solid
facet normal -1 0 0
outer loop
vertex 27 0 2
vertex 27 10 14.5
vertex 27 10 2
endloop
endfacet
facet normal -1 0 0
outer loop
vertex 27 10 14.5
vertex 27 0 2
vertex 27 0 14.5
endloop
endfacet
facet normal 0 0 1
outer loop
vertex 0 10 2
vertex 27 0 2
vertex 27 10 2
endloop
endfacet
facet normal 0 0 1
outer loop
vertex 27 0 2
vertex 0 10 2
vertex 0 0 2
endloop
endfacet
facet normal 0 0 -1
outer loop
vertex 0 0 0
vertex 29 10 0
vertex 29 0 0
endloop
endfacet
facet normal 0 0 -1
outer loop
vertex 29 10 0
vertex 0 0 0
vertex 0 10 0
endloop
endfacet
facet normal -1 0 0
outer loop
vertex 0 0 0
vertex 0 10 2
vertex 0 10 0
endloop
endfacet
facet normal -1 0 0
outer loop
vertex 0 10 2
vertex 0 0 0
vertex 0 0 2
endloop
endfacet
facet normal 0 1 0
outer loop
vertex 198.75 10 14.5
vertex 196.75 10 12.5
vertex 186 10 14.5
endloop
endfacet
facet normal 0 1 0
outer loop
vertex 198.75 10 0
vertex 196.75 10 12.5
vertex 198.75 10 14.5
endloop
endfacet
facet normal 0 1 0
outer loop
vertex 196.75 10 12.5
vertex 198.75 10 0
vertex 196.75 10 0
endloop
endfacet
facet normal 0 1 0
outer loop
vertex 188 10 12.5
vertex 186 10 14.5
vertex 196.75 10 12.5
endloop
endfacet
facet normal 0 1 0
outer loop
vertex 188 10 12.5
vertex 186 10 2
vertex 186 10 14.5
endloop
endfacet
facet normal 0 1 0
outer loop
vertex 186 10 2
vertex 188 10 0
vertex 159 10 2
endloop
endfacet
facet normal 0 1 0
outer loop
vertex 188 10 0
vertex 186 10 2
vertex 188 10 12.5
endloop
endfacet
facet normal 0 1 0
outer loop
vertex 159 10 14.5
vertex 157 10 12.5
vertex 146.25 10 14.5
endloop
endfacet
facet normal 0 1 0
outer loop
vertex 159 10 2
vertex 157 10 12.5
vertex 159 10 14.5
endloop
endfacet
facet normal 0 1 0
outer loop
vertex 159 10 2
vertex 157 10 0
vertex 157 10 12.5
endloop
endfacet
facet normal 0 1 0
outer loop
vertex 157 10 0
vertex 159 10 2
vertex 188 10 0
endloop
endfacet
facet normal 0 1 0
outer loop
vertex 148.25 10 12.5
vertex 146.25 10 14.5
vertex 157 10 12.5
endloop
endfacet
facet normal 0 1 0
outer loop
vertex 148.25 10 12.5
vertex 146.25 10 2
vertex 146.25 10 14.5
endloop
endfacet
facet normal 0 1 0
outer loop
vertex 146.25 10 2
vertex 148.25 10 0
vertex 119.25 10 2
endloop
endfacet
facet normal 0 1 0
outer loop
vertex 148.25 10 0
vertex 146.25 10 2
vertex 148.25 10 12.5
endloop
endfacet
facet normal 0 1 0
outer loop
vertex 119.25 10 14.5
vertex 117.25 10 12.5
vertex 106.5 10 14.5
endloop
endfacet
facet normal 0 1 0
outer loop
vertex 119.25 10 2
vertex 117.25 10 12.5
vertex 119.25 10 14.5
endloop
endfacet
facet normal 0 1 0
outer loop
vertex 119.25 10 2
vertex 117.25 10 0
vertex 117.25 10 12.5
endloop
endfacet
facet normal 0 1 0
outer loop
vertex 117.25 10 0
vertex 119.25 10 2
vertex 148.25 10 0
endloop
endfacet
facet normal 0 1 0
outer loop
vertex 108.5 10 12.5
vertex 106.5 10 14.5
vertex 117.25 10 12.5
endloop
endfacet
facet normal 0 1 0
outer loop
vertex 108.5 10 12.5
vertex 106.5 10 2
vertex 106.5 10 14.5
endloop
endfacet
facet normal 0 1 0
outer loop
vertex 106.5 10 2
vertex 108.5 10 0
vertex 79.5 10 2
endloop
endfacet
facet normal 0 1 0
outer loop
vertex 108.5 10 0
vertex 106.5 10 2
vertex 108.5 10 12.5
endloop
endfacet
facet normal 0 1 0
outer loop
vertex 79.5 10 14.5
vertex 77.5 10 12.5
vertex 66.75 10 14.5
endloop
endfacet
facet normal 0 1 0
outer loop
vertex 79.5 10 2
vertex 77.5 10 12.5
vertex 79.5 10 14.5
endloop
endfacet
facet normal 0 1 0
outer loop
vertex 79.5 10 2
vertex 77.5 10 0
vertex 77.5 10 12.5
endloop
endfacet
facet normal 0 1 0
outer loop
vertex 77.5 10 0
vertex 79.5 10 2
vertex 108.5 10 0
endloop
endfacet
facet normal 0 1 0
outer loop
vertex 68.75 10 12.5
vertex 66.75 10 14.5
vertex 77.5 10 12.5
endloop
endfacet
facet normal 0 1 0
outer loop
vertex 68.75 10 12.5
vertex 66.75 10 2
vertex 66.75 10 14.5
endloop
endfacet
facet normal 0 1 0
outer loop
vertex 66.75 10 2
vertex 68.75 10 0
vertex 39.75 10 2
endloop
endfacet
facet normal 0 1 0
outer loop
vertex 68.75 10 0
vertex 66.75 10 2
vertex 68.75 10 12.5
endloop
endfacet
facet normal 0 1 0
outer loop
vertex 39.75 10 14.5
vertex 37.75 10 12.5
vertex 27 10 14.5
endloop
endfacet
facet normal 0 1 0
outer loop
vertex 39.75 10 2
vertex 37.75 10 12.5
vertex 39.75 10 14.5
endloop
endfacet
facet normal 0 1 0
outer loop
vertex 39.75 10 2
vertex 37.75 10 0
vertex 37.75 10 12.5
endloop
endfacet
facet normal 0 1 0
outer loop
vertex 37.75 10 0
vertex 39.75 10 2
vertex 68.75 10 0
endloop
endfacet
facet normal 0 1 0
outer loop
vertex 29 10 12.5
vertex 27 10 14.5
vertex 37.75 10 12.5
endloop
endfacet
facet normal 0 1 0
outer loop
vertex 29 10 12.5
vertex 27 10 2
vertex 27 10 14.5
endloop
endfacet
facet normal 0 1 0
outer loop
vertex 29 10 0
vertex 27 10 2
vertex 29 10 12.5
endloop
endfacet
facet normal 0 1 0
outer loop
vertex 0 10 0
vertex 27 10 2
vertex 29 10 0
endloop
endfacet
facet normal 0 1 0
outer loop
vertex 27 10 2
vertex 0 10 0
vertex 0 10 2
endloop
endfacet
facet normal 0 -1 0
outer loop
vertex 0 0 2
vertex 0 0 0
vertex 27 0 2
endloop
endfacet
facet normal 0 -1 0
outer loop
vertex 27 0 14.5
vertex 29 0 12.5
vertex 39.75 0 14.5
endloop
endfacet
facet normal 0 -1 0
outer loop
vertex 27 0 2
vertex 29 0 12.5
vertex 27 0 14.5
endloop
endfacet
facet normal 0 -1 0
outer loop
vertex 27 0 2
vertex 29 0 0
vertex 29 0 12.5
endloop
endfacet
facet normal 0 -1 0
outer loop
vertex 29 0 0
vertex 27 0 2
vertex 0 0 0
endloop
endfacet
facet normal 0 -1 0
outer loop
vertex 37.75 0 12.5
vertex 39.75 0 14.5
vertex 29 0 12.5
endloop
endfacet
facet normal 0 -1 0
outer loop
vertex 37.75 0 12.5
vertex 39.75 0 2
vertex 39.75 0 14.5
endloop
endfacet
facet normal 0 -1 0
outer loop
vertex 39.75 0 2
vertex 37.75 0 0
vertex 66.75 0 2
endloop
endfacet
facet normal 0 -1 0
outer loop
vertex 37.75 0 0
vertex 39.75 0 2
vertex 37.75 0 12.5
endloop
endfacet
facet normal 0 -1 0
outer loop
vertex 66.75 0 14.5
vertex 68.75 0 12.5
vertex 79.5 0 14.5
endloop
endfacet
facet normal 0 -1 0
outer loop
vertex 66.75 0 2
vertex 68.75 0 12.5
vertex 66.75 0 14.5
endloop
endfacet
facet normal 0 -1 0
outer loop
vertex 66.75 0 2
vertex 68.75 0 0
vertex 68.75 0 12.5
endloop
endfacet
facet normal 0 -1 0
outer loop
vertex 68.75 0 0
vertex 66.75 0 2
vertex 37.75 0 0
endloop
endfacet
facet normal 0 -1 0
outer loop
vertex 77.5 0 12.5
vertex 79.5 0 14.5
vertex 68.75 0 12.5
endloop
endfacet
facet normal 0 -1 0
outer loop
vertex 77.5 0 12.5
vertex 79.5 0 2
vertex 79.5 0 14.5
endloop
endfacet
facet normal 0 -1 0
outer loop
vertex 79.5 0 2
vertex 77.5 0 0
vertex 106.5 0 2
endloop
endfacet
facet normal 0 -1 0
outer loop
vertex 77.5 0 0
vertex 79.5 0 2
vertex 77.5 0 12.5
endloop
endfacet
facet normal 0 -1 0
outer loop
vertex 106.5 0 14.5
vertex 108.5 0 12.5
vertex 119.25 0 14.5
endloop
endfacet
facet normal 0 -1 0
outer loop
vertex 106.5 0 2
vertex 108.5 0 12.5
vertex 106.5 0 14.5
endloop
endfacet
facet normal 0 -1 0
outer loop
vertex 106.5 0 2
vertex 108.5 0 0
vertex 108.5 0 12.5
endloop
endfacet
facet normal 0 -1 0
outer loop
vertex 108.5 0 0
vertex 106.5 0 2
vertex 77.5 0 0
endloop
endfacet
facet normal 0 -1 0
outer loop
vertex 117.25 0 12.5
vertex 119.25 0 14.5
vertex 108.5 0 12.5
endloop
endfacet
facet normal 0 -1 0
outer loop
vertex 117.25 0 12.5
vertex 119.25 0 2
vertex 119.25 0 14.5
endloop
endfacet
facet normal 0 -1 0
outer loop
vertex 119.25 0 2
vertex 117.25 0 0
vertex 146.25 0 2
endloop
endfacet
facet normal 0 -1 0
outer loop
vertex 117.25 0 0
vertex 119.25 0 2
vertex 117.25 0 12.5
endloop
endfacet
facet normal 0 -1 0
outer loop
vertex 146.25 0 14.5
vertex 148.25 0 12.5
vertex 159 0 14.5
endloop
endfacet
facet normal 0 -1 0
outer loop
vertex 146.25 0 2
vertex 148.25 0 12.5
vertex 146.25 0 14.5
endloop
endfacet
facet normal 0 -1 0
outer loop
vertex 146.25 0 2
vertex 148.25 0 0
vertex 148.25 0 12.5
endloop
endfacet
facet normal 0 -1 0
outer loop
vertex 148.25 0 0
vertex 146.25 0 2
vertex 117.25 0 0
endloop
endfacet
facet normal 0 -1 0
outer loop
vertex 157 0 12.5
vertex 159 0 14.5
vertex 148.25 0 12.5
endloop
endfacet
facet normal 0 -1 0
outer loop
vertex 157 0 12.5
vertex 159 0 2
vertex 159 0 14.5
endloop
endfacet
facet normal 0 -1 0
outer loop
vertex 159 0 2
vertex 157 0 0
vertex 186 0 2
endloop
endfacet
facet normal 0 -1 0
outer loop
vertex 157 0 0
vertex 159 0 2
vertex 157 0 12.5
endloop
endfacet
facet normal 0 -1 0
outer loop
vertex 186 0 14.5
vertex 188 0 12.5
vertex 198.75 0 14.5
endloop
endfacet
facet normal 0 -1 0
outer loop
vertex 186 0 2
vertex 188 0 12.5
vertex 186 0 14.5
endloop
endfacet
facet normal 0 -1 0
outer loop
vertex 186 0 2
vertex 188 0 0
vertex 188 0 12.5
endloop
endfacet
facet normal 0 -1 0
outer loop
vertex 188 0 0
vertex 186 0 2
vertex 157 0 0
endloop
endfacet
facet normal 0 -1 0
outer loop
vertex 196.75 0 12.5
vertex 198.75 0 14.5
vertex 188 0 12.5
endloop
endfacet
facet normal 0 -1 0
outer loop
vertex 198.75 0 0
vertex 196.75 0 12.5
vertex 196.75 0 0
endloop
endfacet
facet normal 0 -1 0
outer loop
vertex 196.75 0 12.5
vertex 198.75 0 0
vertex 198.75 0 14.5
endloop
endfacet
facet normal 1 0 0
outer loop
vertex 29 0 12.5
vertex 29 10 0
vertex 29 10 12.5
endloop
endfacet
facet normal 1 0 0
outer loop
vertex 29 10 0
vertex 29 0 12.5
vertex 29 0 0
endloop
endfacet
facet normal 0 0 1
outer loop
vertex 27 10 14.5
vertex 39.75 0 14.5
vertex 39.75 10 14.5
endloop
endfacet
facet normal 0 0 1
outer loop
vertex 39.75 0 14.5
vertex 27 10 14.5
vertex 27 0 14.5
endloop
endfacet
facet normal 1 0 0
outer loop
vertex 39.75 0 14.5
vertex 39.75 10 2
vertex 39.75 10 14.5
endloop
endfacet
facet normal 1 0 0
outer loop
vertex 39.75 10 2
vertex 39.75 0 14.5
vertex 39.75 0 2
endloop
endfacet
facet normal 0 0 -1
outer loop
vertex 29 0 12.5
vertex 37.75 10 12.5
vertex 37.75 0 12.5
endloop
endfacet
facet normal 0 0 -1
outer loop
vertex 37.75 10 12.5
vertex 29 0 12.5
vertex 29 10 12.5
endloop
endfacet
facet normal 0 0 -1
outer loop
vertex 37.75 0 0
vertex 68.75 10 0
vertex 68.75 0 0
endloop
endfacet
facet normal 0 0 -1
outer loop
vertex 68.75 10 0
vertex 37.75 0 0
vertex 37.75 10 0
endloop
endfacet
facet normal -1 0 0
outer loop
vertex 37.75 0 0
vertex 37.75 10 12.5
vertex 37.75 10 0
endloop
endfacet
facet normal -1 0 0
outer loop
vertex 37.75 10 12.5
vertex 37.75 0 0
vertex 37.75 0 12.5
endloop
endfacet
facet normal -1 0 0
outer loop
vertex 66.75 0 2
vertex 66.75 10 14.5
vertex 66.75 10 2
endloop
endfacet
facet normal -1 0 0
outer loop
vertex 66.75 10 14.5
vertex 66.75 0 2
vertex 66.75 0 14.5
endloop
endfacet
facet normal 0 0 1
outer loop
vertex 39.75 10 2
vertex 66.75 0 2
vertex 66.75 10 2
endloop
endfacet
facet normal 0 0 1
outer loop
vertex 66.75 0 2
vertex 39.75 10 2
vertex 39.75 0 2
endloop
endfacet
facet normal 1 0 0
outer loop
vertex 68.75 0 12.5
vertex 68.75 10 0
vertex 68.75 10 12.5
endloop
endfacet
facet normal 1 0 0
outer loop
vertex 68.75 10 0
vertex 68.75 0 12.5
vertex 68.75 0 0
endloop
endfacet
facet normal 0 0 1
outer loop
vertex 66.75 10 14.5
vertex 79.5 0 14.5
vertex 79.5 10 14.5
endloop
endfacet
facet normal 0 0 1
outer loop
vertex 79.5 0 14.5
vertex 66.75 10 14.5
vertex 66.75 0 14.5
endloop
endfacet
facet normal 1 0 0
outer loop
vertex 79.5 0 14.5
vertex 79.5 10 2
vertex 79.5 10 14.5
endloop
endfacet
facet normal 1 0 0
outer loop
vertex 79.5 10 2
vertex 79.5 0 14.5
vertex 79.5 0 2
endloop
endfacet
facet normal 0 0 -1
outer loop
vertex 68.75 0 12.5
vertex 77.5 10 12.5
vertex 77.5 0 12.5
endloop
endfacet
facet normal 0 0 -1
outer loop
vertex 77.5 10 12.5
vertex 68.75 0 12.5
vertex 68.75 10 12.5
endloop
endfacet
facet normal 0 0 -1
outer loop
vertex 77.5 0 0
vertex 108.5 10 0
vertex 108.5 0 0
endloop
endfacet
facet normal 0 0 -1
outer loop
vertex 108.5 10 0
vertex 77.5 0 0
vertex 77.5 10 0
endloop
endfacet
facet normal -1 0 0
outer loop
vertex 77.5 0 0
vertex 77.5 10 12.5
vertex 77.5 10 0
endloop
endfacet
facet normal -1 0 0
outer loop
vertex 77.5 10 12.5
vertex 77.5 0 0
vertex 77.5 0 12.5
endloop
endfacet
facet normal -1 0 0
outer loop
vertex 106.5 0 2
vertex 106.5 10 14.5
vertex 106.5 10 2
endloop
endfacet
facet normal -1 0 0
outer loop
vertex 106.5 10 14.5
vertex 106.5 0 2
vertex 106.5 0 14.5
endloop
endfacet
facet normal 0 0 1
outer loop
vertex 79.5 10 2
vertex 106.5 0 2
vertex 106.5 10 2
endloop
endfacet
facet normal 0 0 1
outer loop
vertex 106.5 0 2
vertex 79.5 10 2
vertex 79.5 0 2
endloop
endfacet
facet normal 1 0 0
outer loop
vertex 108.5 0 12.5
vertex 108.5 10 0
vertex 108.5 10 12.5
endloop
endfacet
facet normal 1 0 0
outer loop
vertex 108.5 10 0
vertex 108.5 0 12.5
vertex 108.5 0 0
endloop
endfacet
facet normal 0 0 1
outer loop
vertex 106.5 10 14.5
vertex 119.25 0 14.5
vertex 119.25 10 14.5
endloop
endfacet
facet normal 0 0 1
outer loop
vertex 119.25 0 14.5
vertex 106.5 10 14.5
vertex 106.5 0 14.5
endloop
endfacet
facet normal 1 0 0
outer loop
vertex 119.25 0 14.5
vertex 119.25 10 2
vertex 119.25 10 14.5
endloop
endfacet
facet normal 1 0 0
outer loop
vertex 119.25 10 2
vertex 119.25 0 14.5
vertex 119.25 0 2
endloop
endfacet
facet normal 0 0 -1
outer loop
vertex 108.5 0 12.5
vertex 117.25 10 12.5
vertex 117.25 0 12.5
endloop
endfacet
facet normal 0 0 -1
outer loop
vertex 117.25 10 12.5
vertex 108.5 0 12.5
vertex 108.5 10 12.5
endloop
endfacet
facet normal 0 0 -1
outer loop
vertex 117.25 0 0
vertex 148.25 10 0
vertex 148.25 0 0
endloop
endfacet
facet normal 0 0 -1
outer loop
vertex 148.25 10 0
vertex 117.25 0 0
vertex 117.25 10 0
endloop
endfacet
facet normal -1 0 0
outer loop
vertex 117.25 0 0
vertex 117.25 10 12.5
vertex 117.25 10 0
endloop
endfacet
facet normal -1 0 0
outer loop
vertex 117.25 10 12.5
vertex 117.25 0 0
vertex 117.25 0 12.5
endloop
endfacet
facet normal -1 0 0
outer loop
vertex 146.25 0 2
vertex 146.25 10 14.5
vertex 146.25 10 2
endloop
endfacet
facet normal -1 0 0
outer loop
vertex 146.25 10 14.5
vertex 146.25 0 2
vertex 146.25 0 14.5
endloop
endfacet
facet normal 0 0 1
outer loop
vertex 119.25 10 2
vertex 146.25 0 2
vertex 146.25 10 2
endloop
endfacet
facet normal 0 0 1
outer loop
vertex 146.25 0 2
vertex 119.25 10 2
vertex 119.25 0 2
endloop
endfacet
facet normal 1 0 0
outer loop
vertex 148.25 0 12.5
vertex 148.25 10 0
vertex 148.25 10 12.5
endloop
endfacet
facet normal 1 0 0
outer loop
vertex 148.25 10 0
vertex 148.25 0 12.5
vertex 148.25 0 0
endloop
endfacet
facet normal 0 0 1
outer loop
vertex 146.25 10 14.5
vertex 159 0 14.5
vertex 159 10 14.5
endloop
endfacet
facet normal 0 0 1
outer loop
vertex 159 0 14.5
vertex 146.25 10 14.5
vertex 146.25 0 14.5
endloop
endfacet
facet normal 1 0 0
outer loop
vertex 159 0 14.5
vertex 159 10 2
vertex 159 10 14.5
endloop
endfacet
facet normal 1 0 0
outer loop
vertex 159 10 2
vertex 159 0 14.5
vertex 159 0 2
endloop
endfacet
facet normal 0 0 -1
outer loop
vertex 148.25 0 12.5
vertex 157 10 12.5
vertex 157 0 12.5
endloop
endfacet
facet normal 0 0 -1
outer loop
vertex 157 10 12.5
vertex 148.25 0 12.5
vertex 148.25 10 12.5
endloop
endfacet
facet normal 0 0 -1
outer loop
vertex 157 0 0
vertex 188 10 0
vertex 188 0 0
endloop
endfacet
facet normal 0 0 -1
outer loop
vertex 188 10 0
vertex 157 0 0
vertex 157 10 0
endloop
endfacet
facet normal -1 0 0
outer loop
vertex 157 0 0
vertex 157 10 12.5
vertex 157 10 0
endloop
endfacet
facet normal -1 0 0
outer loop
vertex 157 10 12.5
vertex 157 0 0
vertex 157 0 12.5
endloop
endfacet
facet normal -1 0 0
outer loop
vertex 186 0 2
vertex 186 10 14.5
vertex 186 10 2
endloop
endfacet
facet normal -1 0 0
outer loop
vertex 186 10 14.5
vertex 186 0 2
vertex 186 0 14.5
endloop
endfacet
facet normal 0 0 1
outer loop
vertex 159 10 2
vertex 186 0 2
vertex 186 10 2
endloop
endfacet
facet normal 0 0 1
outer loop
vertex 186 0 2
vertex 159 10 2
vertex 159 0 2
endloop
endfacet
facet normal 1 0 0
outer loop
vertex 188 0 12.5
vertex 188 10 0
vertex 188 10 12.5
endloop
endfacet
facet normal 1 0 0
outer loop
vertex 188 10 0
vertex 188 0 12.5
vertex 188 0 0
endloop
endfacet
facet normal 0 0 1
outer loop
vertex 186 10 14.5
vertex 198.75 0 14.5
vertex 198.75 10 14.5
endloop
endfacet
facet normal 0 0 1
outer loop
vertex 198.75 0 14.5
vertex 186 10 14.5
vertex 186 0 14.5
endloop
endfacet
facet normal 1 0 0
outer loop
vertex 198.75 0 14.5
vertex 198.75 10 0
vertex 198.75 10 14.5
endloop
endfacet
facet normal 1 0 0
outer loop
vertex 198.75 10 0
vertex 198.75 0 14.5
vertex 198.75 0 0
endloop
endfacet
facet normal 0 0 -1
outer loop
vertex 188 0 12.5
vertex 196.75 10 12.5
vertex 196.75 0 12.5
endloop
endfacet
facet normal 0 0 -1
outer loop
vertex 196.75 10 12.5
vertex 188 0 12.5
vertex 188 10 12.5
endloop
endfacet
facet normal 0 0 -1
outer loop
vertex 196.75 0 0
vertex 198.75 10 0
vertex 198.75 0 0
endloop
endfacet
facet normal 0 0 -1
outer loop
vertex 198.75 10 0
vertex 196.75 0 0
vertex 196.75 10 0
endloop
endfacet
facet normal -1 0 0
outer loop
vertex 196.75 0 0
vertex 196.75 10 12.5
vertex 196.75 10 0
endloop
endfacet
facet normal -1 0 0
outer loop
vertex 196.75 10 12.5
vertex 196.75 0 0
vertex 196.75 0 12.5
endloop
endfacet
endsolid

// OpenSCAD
$fn = 180;
panel_width = 27;
panel_gap = 12.75;
panel_depth = 12.5;
trim_thickness = 2;
trim_height = 10;

union() {
  trim();
  for (i = [0:4]) {
    translate([(panel_width+panel_gap)*i, 0, 0])
    trim();
  }

  // bottom cable track
  // translate([0, trim_height, 0])
  // difference() {
  //   cube([200.75-trim_thickness, 20, panel_depth+trim_thickness]);

  //   translate([0, trim_thickness, trim_thickness])
  //   cube([200.75-trim_thickness, 20-trim_thickness*2, panel_depth]);
  // }
}

// // generic keyboard arms
// arm_width = 64;
// arm_depth = 10;
// lip_thickness = 5;

// union() {
//   mirror([0, 0, 1])
//   union() {
//     full_trim();
//     for(i = [0:7]) {
//       translate([0, trim_height*i, 0])
//       full_trim();
//     }
//   }

//   translate([-panel_gap, 0, -panel_depth-trim_thickness])
//   arm(panel_gap, arm_width);
//   // translate([-trim_thickness, 0, 0])
//   // arm(panel_width + trim_thickness*2, arm_width - panel_depth - trim_thickness, with_hull = false);
//   translate([panel_width, 0, -panel_depth-trim_thickness])
//   arm(panel_gap, arm_width);
// }

// module arm(width, length, with_hull = true) {
//   cube([width, arm_depth, length + panel_depth]);

//   // for strength
//   if (with_hull) {
//     hull() {
//       cube([width, arm_depth, panel_depth + trim_thickness]);
//       cube([width, trim_height * 8, 1]);
//     }
//   }

//   // lip
//   translate([0, lip_thickness, length + panel_depth - lip_thickness])
//   cube([width, arm_depth, lip_thickness]);
// }

// mercedes mount
// union() {
//   full_trim();
//   for(i = [0:7]) {
//     translate([0, trim_height*i, 0])
//     full_trim();
//   }

//   translate([-114.5, 30, 118])
//   rotate([270, 0, 0])
//   import("/Users/evansutherland/Downloads/obj_1_Body_02.stl");
// }

// mclaren mount
// union() {
//   full_trim();
//   for(i = [0:7]) {
//     translate([0, trim_height*i, 0])
//     full_trim();
//   }

//   translate([-6, -88, 117.5])
//   rotate([0, 90, 0])
//   import("/Users/evansutherland/Downloads/obj_1_McClaren Lego Wall Mount V1.STL.stl");
// }

module trim() {
  union() {
    color("orange")
    cube([panel_width, trim_height, trim_thickness]);

    color("yellow")
    translate([panel_width, 0, 0])
    cube([trim_thickness, trim_height, panel_depth+trim_thickness]);

    color("green")
    translate([panel_width, 0, panel_depth])
    cube([panel_gap, trim_height, trim_thickness]);

    color("blue")
    translate([panel_width+panel_gap-trim_thickness, 0, 0])
    cube([trim_thickness, trim_height, panel_depth+trim_thickness]);
  }
}

module full_trim() {
  union() {
    trim();
    mirror([1, 0, 0])
    translate([-panel_width, 0, 0])
    trim();
  }
}

inner_width = 74.5;
inner_height = 114;

// union() {
//   outlet_trim();
//   translate([0, inner_height+trim_height, 0])
//   outlet_trim();

//   translate([-trim_thickness-15-trim_height, 0, 0])
//   cube([trim_height, inner_height+trim_height+trim_height, trim_thickness]);

//   color("blue")
//   translate([-trim_thickness-15-trim_height+inner_width+trim_height-trim_thickness, trim_height, 0])
//   cube([trim_thickness, inner_height+trim_height-trim_height, panel_depth+trim_thickness]);

//   color("aqua")
//   translate([-trim_thickness-15-trim_height+inner_width+trim_height-inner_width, trim_height, 0])
//   cube([trim_thickness, inner_height+trim_height-trim_height, panel_depth+trim_thickness]);

//   translate([-trim_thickness-15-trim_height+inner_width+trim_height, 0, 0])
//   cube([trim_height, inner_height+trim_height+trim_height, trim_thickness]);

//   color("pink")
//   translate([-trim_thickness-15, trim_height, 0])
//   cube([inner_width, trim_thickness, panel_depth+trim_thickness]);

//   color("purple")
//   translate([-trim_thickness-15, trim_height+inner_height-trim_thickness, 0])
//   cube([inner_width, trim_thickness, panel_depth+trim_thickness]);
// }

module outlet_trim() {
  union() {
    translate([-trim_thickness-15, 0, 0])
    color("orange")
    cube([trim_thickness+15, trim_height, trim_thickness]);

    color("blue")
    translate([-trim_thickness, 0, 0])
    cube([trim_thickness, trim_height, panel_depth+trim_thickness]);
    
    color("green")
    translate([-trim_thickness, 0, panel_depth])
    cube([panel_gap, trim_height, trim_thickness]);

    color("red")
    translate([panel_gap-trim_thickness*2, 0, 0])
    cube([trim_thickness, trim_height, panel_depth+trim_thickness]);

    translate([panel_gap-trim_thickness, 0, 0])
    color("orange")
    cube([panel_width, trim_height, trim_thickness]);

    color("yellow")
    translate([panel_gap+panel_width-trim_thickness, 0, 0])
    cube([trim_thickness, trim_height, panel_depth+trim_thickness]);

    color("green")
    translate([panel_gap+panel_width-trim_thickness, 0, panel_depth])
    cube([panel_gap, trim_height, trim_thickness]);

    color("blue")
    translate([panel_gap+panel_width+panel_gap-trim_thickness*2, 0, 0])
    cube([trim_thickness, trim_height, panel_depth+trim_thickness]);

    translate([panel_gap+panel_width+panel_gap-trim_thickness*2, 0, 0])
    color("orange")
    cube([trim_thickness+7, trim_height, trim_thickness]);
  }
}


// union() {
//   outlet_half_trim();
//   translate([0, inner_height+trim_height, 0])
//   outlet_half_trim();

//   translate([-trim_thickness-15-trim_height+inner_width+trim_height+2, 0, 0])
//   cube([trim_height, inner_height+trim_height+trim_height, trim_thickness]);

//   color("blue")
//   translate([-trim_thickness-15-trim_height+inner_width+trim_height+2, trim_height, 0])
//   cube([trim_thickness, inner_height+trim_height-trim_height, panel_depth+trim_thickness]);

//   color("pink")
//   translate([panel_gap-trim_thickness*2, trim_height, 0])
//   cube([50.25+trim_thickness, trim_thickness, panel_depth+trim_thickness]);

//   color("purple")
//   translate([panel_gap-trim_thickness*2, trim_height+inner_height, 0])
//   cube([50.25+trim_thickness, trim_thickness, panel_depth+trim_thickness]);
// }

module outlet_half_trim() {
  union() {
    color("red")
    translate([panel_gap-trim_thickness*2, 0, 0])
    cube([trim_thickness, trim_height, panel_depth+trim_thickness]);

    translate([panel_gap-trim_thickness, 0, 0])
    color("orange")
    cube([panel_width, trim_height, trim_thickness]);

    color("yellow")
    translate([panel_gap+panel_width-trim_thickness, 0, 0])
    cube([trim_thickness, trim_height, panel_depth+trim_thickness]);

    color("green")
    translate([panel_gap+panel_width-trim_thickness, 0, panel_depth])
    cube([panel_gap, trim_height, trim_thickness]);

    color("blue")
    translate([panel_gap+panel_width+panel_gap-trim_thickness*2, 0, 0])
    cube([trim_thickness, trim_height, panel_depth+trim_thickness]);

    translate([panel_gap+panel_width+panel_gap-trim_thickness*2, 0, 0])
    color("orange")
    cube([trim_thickness+9, trim_height, trim_thickness]);
  }
}
